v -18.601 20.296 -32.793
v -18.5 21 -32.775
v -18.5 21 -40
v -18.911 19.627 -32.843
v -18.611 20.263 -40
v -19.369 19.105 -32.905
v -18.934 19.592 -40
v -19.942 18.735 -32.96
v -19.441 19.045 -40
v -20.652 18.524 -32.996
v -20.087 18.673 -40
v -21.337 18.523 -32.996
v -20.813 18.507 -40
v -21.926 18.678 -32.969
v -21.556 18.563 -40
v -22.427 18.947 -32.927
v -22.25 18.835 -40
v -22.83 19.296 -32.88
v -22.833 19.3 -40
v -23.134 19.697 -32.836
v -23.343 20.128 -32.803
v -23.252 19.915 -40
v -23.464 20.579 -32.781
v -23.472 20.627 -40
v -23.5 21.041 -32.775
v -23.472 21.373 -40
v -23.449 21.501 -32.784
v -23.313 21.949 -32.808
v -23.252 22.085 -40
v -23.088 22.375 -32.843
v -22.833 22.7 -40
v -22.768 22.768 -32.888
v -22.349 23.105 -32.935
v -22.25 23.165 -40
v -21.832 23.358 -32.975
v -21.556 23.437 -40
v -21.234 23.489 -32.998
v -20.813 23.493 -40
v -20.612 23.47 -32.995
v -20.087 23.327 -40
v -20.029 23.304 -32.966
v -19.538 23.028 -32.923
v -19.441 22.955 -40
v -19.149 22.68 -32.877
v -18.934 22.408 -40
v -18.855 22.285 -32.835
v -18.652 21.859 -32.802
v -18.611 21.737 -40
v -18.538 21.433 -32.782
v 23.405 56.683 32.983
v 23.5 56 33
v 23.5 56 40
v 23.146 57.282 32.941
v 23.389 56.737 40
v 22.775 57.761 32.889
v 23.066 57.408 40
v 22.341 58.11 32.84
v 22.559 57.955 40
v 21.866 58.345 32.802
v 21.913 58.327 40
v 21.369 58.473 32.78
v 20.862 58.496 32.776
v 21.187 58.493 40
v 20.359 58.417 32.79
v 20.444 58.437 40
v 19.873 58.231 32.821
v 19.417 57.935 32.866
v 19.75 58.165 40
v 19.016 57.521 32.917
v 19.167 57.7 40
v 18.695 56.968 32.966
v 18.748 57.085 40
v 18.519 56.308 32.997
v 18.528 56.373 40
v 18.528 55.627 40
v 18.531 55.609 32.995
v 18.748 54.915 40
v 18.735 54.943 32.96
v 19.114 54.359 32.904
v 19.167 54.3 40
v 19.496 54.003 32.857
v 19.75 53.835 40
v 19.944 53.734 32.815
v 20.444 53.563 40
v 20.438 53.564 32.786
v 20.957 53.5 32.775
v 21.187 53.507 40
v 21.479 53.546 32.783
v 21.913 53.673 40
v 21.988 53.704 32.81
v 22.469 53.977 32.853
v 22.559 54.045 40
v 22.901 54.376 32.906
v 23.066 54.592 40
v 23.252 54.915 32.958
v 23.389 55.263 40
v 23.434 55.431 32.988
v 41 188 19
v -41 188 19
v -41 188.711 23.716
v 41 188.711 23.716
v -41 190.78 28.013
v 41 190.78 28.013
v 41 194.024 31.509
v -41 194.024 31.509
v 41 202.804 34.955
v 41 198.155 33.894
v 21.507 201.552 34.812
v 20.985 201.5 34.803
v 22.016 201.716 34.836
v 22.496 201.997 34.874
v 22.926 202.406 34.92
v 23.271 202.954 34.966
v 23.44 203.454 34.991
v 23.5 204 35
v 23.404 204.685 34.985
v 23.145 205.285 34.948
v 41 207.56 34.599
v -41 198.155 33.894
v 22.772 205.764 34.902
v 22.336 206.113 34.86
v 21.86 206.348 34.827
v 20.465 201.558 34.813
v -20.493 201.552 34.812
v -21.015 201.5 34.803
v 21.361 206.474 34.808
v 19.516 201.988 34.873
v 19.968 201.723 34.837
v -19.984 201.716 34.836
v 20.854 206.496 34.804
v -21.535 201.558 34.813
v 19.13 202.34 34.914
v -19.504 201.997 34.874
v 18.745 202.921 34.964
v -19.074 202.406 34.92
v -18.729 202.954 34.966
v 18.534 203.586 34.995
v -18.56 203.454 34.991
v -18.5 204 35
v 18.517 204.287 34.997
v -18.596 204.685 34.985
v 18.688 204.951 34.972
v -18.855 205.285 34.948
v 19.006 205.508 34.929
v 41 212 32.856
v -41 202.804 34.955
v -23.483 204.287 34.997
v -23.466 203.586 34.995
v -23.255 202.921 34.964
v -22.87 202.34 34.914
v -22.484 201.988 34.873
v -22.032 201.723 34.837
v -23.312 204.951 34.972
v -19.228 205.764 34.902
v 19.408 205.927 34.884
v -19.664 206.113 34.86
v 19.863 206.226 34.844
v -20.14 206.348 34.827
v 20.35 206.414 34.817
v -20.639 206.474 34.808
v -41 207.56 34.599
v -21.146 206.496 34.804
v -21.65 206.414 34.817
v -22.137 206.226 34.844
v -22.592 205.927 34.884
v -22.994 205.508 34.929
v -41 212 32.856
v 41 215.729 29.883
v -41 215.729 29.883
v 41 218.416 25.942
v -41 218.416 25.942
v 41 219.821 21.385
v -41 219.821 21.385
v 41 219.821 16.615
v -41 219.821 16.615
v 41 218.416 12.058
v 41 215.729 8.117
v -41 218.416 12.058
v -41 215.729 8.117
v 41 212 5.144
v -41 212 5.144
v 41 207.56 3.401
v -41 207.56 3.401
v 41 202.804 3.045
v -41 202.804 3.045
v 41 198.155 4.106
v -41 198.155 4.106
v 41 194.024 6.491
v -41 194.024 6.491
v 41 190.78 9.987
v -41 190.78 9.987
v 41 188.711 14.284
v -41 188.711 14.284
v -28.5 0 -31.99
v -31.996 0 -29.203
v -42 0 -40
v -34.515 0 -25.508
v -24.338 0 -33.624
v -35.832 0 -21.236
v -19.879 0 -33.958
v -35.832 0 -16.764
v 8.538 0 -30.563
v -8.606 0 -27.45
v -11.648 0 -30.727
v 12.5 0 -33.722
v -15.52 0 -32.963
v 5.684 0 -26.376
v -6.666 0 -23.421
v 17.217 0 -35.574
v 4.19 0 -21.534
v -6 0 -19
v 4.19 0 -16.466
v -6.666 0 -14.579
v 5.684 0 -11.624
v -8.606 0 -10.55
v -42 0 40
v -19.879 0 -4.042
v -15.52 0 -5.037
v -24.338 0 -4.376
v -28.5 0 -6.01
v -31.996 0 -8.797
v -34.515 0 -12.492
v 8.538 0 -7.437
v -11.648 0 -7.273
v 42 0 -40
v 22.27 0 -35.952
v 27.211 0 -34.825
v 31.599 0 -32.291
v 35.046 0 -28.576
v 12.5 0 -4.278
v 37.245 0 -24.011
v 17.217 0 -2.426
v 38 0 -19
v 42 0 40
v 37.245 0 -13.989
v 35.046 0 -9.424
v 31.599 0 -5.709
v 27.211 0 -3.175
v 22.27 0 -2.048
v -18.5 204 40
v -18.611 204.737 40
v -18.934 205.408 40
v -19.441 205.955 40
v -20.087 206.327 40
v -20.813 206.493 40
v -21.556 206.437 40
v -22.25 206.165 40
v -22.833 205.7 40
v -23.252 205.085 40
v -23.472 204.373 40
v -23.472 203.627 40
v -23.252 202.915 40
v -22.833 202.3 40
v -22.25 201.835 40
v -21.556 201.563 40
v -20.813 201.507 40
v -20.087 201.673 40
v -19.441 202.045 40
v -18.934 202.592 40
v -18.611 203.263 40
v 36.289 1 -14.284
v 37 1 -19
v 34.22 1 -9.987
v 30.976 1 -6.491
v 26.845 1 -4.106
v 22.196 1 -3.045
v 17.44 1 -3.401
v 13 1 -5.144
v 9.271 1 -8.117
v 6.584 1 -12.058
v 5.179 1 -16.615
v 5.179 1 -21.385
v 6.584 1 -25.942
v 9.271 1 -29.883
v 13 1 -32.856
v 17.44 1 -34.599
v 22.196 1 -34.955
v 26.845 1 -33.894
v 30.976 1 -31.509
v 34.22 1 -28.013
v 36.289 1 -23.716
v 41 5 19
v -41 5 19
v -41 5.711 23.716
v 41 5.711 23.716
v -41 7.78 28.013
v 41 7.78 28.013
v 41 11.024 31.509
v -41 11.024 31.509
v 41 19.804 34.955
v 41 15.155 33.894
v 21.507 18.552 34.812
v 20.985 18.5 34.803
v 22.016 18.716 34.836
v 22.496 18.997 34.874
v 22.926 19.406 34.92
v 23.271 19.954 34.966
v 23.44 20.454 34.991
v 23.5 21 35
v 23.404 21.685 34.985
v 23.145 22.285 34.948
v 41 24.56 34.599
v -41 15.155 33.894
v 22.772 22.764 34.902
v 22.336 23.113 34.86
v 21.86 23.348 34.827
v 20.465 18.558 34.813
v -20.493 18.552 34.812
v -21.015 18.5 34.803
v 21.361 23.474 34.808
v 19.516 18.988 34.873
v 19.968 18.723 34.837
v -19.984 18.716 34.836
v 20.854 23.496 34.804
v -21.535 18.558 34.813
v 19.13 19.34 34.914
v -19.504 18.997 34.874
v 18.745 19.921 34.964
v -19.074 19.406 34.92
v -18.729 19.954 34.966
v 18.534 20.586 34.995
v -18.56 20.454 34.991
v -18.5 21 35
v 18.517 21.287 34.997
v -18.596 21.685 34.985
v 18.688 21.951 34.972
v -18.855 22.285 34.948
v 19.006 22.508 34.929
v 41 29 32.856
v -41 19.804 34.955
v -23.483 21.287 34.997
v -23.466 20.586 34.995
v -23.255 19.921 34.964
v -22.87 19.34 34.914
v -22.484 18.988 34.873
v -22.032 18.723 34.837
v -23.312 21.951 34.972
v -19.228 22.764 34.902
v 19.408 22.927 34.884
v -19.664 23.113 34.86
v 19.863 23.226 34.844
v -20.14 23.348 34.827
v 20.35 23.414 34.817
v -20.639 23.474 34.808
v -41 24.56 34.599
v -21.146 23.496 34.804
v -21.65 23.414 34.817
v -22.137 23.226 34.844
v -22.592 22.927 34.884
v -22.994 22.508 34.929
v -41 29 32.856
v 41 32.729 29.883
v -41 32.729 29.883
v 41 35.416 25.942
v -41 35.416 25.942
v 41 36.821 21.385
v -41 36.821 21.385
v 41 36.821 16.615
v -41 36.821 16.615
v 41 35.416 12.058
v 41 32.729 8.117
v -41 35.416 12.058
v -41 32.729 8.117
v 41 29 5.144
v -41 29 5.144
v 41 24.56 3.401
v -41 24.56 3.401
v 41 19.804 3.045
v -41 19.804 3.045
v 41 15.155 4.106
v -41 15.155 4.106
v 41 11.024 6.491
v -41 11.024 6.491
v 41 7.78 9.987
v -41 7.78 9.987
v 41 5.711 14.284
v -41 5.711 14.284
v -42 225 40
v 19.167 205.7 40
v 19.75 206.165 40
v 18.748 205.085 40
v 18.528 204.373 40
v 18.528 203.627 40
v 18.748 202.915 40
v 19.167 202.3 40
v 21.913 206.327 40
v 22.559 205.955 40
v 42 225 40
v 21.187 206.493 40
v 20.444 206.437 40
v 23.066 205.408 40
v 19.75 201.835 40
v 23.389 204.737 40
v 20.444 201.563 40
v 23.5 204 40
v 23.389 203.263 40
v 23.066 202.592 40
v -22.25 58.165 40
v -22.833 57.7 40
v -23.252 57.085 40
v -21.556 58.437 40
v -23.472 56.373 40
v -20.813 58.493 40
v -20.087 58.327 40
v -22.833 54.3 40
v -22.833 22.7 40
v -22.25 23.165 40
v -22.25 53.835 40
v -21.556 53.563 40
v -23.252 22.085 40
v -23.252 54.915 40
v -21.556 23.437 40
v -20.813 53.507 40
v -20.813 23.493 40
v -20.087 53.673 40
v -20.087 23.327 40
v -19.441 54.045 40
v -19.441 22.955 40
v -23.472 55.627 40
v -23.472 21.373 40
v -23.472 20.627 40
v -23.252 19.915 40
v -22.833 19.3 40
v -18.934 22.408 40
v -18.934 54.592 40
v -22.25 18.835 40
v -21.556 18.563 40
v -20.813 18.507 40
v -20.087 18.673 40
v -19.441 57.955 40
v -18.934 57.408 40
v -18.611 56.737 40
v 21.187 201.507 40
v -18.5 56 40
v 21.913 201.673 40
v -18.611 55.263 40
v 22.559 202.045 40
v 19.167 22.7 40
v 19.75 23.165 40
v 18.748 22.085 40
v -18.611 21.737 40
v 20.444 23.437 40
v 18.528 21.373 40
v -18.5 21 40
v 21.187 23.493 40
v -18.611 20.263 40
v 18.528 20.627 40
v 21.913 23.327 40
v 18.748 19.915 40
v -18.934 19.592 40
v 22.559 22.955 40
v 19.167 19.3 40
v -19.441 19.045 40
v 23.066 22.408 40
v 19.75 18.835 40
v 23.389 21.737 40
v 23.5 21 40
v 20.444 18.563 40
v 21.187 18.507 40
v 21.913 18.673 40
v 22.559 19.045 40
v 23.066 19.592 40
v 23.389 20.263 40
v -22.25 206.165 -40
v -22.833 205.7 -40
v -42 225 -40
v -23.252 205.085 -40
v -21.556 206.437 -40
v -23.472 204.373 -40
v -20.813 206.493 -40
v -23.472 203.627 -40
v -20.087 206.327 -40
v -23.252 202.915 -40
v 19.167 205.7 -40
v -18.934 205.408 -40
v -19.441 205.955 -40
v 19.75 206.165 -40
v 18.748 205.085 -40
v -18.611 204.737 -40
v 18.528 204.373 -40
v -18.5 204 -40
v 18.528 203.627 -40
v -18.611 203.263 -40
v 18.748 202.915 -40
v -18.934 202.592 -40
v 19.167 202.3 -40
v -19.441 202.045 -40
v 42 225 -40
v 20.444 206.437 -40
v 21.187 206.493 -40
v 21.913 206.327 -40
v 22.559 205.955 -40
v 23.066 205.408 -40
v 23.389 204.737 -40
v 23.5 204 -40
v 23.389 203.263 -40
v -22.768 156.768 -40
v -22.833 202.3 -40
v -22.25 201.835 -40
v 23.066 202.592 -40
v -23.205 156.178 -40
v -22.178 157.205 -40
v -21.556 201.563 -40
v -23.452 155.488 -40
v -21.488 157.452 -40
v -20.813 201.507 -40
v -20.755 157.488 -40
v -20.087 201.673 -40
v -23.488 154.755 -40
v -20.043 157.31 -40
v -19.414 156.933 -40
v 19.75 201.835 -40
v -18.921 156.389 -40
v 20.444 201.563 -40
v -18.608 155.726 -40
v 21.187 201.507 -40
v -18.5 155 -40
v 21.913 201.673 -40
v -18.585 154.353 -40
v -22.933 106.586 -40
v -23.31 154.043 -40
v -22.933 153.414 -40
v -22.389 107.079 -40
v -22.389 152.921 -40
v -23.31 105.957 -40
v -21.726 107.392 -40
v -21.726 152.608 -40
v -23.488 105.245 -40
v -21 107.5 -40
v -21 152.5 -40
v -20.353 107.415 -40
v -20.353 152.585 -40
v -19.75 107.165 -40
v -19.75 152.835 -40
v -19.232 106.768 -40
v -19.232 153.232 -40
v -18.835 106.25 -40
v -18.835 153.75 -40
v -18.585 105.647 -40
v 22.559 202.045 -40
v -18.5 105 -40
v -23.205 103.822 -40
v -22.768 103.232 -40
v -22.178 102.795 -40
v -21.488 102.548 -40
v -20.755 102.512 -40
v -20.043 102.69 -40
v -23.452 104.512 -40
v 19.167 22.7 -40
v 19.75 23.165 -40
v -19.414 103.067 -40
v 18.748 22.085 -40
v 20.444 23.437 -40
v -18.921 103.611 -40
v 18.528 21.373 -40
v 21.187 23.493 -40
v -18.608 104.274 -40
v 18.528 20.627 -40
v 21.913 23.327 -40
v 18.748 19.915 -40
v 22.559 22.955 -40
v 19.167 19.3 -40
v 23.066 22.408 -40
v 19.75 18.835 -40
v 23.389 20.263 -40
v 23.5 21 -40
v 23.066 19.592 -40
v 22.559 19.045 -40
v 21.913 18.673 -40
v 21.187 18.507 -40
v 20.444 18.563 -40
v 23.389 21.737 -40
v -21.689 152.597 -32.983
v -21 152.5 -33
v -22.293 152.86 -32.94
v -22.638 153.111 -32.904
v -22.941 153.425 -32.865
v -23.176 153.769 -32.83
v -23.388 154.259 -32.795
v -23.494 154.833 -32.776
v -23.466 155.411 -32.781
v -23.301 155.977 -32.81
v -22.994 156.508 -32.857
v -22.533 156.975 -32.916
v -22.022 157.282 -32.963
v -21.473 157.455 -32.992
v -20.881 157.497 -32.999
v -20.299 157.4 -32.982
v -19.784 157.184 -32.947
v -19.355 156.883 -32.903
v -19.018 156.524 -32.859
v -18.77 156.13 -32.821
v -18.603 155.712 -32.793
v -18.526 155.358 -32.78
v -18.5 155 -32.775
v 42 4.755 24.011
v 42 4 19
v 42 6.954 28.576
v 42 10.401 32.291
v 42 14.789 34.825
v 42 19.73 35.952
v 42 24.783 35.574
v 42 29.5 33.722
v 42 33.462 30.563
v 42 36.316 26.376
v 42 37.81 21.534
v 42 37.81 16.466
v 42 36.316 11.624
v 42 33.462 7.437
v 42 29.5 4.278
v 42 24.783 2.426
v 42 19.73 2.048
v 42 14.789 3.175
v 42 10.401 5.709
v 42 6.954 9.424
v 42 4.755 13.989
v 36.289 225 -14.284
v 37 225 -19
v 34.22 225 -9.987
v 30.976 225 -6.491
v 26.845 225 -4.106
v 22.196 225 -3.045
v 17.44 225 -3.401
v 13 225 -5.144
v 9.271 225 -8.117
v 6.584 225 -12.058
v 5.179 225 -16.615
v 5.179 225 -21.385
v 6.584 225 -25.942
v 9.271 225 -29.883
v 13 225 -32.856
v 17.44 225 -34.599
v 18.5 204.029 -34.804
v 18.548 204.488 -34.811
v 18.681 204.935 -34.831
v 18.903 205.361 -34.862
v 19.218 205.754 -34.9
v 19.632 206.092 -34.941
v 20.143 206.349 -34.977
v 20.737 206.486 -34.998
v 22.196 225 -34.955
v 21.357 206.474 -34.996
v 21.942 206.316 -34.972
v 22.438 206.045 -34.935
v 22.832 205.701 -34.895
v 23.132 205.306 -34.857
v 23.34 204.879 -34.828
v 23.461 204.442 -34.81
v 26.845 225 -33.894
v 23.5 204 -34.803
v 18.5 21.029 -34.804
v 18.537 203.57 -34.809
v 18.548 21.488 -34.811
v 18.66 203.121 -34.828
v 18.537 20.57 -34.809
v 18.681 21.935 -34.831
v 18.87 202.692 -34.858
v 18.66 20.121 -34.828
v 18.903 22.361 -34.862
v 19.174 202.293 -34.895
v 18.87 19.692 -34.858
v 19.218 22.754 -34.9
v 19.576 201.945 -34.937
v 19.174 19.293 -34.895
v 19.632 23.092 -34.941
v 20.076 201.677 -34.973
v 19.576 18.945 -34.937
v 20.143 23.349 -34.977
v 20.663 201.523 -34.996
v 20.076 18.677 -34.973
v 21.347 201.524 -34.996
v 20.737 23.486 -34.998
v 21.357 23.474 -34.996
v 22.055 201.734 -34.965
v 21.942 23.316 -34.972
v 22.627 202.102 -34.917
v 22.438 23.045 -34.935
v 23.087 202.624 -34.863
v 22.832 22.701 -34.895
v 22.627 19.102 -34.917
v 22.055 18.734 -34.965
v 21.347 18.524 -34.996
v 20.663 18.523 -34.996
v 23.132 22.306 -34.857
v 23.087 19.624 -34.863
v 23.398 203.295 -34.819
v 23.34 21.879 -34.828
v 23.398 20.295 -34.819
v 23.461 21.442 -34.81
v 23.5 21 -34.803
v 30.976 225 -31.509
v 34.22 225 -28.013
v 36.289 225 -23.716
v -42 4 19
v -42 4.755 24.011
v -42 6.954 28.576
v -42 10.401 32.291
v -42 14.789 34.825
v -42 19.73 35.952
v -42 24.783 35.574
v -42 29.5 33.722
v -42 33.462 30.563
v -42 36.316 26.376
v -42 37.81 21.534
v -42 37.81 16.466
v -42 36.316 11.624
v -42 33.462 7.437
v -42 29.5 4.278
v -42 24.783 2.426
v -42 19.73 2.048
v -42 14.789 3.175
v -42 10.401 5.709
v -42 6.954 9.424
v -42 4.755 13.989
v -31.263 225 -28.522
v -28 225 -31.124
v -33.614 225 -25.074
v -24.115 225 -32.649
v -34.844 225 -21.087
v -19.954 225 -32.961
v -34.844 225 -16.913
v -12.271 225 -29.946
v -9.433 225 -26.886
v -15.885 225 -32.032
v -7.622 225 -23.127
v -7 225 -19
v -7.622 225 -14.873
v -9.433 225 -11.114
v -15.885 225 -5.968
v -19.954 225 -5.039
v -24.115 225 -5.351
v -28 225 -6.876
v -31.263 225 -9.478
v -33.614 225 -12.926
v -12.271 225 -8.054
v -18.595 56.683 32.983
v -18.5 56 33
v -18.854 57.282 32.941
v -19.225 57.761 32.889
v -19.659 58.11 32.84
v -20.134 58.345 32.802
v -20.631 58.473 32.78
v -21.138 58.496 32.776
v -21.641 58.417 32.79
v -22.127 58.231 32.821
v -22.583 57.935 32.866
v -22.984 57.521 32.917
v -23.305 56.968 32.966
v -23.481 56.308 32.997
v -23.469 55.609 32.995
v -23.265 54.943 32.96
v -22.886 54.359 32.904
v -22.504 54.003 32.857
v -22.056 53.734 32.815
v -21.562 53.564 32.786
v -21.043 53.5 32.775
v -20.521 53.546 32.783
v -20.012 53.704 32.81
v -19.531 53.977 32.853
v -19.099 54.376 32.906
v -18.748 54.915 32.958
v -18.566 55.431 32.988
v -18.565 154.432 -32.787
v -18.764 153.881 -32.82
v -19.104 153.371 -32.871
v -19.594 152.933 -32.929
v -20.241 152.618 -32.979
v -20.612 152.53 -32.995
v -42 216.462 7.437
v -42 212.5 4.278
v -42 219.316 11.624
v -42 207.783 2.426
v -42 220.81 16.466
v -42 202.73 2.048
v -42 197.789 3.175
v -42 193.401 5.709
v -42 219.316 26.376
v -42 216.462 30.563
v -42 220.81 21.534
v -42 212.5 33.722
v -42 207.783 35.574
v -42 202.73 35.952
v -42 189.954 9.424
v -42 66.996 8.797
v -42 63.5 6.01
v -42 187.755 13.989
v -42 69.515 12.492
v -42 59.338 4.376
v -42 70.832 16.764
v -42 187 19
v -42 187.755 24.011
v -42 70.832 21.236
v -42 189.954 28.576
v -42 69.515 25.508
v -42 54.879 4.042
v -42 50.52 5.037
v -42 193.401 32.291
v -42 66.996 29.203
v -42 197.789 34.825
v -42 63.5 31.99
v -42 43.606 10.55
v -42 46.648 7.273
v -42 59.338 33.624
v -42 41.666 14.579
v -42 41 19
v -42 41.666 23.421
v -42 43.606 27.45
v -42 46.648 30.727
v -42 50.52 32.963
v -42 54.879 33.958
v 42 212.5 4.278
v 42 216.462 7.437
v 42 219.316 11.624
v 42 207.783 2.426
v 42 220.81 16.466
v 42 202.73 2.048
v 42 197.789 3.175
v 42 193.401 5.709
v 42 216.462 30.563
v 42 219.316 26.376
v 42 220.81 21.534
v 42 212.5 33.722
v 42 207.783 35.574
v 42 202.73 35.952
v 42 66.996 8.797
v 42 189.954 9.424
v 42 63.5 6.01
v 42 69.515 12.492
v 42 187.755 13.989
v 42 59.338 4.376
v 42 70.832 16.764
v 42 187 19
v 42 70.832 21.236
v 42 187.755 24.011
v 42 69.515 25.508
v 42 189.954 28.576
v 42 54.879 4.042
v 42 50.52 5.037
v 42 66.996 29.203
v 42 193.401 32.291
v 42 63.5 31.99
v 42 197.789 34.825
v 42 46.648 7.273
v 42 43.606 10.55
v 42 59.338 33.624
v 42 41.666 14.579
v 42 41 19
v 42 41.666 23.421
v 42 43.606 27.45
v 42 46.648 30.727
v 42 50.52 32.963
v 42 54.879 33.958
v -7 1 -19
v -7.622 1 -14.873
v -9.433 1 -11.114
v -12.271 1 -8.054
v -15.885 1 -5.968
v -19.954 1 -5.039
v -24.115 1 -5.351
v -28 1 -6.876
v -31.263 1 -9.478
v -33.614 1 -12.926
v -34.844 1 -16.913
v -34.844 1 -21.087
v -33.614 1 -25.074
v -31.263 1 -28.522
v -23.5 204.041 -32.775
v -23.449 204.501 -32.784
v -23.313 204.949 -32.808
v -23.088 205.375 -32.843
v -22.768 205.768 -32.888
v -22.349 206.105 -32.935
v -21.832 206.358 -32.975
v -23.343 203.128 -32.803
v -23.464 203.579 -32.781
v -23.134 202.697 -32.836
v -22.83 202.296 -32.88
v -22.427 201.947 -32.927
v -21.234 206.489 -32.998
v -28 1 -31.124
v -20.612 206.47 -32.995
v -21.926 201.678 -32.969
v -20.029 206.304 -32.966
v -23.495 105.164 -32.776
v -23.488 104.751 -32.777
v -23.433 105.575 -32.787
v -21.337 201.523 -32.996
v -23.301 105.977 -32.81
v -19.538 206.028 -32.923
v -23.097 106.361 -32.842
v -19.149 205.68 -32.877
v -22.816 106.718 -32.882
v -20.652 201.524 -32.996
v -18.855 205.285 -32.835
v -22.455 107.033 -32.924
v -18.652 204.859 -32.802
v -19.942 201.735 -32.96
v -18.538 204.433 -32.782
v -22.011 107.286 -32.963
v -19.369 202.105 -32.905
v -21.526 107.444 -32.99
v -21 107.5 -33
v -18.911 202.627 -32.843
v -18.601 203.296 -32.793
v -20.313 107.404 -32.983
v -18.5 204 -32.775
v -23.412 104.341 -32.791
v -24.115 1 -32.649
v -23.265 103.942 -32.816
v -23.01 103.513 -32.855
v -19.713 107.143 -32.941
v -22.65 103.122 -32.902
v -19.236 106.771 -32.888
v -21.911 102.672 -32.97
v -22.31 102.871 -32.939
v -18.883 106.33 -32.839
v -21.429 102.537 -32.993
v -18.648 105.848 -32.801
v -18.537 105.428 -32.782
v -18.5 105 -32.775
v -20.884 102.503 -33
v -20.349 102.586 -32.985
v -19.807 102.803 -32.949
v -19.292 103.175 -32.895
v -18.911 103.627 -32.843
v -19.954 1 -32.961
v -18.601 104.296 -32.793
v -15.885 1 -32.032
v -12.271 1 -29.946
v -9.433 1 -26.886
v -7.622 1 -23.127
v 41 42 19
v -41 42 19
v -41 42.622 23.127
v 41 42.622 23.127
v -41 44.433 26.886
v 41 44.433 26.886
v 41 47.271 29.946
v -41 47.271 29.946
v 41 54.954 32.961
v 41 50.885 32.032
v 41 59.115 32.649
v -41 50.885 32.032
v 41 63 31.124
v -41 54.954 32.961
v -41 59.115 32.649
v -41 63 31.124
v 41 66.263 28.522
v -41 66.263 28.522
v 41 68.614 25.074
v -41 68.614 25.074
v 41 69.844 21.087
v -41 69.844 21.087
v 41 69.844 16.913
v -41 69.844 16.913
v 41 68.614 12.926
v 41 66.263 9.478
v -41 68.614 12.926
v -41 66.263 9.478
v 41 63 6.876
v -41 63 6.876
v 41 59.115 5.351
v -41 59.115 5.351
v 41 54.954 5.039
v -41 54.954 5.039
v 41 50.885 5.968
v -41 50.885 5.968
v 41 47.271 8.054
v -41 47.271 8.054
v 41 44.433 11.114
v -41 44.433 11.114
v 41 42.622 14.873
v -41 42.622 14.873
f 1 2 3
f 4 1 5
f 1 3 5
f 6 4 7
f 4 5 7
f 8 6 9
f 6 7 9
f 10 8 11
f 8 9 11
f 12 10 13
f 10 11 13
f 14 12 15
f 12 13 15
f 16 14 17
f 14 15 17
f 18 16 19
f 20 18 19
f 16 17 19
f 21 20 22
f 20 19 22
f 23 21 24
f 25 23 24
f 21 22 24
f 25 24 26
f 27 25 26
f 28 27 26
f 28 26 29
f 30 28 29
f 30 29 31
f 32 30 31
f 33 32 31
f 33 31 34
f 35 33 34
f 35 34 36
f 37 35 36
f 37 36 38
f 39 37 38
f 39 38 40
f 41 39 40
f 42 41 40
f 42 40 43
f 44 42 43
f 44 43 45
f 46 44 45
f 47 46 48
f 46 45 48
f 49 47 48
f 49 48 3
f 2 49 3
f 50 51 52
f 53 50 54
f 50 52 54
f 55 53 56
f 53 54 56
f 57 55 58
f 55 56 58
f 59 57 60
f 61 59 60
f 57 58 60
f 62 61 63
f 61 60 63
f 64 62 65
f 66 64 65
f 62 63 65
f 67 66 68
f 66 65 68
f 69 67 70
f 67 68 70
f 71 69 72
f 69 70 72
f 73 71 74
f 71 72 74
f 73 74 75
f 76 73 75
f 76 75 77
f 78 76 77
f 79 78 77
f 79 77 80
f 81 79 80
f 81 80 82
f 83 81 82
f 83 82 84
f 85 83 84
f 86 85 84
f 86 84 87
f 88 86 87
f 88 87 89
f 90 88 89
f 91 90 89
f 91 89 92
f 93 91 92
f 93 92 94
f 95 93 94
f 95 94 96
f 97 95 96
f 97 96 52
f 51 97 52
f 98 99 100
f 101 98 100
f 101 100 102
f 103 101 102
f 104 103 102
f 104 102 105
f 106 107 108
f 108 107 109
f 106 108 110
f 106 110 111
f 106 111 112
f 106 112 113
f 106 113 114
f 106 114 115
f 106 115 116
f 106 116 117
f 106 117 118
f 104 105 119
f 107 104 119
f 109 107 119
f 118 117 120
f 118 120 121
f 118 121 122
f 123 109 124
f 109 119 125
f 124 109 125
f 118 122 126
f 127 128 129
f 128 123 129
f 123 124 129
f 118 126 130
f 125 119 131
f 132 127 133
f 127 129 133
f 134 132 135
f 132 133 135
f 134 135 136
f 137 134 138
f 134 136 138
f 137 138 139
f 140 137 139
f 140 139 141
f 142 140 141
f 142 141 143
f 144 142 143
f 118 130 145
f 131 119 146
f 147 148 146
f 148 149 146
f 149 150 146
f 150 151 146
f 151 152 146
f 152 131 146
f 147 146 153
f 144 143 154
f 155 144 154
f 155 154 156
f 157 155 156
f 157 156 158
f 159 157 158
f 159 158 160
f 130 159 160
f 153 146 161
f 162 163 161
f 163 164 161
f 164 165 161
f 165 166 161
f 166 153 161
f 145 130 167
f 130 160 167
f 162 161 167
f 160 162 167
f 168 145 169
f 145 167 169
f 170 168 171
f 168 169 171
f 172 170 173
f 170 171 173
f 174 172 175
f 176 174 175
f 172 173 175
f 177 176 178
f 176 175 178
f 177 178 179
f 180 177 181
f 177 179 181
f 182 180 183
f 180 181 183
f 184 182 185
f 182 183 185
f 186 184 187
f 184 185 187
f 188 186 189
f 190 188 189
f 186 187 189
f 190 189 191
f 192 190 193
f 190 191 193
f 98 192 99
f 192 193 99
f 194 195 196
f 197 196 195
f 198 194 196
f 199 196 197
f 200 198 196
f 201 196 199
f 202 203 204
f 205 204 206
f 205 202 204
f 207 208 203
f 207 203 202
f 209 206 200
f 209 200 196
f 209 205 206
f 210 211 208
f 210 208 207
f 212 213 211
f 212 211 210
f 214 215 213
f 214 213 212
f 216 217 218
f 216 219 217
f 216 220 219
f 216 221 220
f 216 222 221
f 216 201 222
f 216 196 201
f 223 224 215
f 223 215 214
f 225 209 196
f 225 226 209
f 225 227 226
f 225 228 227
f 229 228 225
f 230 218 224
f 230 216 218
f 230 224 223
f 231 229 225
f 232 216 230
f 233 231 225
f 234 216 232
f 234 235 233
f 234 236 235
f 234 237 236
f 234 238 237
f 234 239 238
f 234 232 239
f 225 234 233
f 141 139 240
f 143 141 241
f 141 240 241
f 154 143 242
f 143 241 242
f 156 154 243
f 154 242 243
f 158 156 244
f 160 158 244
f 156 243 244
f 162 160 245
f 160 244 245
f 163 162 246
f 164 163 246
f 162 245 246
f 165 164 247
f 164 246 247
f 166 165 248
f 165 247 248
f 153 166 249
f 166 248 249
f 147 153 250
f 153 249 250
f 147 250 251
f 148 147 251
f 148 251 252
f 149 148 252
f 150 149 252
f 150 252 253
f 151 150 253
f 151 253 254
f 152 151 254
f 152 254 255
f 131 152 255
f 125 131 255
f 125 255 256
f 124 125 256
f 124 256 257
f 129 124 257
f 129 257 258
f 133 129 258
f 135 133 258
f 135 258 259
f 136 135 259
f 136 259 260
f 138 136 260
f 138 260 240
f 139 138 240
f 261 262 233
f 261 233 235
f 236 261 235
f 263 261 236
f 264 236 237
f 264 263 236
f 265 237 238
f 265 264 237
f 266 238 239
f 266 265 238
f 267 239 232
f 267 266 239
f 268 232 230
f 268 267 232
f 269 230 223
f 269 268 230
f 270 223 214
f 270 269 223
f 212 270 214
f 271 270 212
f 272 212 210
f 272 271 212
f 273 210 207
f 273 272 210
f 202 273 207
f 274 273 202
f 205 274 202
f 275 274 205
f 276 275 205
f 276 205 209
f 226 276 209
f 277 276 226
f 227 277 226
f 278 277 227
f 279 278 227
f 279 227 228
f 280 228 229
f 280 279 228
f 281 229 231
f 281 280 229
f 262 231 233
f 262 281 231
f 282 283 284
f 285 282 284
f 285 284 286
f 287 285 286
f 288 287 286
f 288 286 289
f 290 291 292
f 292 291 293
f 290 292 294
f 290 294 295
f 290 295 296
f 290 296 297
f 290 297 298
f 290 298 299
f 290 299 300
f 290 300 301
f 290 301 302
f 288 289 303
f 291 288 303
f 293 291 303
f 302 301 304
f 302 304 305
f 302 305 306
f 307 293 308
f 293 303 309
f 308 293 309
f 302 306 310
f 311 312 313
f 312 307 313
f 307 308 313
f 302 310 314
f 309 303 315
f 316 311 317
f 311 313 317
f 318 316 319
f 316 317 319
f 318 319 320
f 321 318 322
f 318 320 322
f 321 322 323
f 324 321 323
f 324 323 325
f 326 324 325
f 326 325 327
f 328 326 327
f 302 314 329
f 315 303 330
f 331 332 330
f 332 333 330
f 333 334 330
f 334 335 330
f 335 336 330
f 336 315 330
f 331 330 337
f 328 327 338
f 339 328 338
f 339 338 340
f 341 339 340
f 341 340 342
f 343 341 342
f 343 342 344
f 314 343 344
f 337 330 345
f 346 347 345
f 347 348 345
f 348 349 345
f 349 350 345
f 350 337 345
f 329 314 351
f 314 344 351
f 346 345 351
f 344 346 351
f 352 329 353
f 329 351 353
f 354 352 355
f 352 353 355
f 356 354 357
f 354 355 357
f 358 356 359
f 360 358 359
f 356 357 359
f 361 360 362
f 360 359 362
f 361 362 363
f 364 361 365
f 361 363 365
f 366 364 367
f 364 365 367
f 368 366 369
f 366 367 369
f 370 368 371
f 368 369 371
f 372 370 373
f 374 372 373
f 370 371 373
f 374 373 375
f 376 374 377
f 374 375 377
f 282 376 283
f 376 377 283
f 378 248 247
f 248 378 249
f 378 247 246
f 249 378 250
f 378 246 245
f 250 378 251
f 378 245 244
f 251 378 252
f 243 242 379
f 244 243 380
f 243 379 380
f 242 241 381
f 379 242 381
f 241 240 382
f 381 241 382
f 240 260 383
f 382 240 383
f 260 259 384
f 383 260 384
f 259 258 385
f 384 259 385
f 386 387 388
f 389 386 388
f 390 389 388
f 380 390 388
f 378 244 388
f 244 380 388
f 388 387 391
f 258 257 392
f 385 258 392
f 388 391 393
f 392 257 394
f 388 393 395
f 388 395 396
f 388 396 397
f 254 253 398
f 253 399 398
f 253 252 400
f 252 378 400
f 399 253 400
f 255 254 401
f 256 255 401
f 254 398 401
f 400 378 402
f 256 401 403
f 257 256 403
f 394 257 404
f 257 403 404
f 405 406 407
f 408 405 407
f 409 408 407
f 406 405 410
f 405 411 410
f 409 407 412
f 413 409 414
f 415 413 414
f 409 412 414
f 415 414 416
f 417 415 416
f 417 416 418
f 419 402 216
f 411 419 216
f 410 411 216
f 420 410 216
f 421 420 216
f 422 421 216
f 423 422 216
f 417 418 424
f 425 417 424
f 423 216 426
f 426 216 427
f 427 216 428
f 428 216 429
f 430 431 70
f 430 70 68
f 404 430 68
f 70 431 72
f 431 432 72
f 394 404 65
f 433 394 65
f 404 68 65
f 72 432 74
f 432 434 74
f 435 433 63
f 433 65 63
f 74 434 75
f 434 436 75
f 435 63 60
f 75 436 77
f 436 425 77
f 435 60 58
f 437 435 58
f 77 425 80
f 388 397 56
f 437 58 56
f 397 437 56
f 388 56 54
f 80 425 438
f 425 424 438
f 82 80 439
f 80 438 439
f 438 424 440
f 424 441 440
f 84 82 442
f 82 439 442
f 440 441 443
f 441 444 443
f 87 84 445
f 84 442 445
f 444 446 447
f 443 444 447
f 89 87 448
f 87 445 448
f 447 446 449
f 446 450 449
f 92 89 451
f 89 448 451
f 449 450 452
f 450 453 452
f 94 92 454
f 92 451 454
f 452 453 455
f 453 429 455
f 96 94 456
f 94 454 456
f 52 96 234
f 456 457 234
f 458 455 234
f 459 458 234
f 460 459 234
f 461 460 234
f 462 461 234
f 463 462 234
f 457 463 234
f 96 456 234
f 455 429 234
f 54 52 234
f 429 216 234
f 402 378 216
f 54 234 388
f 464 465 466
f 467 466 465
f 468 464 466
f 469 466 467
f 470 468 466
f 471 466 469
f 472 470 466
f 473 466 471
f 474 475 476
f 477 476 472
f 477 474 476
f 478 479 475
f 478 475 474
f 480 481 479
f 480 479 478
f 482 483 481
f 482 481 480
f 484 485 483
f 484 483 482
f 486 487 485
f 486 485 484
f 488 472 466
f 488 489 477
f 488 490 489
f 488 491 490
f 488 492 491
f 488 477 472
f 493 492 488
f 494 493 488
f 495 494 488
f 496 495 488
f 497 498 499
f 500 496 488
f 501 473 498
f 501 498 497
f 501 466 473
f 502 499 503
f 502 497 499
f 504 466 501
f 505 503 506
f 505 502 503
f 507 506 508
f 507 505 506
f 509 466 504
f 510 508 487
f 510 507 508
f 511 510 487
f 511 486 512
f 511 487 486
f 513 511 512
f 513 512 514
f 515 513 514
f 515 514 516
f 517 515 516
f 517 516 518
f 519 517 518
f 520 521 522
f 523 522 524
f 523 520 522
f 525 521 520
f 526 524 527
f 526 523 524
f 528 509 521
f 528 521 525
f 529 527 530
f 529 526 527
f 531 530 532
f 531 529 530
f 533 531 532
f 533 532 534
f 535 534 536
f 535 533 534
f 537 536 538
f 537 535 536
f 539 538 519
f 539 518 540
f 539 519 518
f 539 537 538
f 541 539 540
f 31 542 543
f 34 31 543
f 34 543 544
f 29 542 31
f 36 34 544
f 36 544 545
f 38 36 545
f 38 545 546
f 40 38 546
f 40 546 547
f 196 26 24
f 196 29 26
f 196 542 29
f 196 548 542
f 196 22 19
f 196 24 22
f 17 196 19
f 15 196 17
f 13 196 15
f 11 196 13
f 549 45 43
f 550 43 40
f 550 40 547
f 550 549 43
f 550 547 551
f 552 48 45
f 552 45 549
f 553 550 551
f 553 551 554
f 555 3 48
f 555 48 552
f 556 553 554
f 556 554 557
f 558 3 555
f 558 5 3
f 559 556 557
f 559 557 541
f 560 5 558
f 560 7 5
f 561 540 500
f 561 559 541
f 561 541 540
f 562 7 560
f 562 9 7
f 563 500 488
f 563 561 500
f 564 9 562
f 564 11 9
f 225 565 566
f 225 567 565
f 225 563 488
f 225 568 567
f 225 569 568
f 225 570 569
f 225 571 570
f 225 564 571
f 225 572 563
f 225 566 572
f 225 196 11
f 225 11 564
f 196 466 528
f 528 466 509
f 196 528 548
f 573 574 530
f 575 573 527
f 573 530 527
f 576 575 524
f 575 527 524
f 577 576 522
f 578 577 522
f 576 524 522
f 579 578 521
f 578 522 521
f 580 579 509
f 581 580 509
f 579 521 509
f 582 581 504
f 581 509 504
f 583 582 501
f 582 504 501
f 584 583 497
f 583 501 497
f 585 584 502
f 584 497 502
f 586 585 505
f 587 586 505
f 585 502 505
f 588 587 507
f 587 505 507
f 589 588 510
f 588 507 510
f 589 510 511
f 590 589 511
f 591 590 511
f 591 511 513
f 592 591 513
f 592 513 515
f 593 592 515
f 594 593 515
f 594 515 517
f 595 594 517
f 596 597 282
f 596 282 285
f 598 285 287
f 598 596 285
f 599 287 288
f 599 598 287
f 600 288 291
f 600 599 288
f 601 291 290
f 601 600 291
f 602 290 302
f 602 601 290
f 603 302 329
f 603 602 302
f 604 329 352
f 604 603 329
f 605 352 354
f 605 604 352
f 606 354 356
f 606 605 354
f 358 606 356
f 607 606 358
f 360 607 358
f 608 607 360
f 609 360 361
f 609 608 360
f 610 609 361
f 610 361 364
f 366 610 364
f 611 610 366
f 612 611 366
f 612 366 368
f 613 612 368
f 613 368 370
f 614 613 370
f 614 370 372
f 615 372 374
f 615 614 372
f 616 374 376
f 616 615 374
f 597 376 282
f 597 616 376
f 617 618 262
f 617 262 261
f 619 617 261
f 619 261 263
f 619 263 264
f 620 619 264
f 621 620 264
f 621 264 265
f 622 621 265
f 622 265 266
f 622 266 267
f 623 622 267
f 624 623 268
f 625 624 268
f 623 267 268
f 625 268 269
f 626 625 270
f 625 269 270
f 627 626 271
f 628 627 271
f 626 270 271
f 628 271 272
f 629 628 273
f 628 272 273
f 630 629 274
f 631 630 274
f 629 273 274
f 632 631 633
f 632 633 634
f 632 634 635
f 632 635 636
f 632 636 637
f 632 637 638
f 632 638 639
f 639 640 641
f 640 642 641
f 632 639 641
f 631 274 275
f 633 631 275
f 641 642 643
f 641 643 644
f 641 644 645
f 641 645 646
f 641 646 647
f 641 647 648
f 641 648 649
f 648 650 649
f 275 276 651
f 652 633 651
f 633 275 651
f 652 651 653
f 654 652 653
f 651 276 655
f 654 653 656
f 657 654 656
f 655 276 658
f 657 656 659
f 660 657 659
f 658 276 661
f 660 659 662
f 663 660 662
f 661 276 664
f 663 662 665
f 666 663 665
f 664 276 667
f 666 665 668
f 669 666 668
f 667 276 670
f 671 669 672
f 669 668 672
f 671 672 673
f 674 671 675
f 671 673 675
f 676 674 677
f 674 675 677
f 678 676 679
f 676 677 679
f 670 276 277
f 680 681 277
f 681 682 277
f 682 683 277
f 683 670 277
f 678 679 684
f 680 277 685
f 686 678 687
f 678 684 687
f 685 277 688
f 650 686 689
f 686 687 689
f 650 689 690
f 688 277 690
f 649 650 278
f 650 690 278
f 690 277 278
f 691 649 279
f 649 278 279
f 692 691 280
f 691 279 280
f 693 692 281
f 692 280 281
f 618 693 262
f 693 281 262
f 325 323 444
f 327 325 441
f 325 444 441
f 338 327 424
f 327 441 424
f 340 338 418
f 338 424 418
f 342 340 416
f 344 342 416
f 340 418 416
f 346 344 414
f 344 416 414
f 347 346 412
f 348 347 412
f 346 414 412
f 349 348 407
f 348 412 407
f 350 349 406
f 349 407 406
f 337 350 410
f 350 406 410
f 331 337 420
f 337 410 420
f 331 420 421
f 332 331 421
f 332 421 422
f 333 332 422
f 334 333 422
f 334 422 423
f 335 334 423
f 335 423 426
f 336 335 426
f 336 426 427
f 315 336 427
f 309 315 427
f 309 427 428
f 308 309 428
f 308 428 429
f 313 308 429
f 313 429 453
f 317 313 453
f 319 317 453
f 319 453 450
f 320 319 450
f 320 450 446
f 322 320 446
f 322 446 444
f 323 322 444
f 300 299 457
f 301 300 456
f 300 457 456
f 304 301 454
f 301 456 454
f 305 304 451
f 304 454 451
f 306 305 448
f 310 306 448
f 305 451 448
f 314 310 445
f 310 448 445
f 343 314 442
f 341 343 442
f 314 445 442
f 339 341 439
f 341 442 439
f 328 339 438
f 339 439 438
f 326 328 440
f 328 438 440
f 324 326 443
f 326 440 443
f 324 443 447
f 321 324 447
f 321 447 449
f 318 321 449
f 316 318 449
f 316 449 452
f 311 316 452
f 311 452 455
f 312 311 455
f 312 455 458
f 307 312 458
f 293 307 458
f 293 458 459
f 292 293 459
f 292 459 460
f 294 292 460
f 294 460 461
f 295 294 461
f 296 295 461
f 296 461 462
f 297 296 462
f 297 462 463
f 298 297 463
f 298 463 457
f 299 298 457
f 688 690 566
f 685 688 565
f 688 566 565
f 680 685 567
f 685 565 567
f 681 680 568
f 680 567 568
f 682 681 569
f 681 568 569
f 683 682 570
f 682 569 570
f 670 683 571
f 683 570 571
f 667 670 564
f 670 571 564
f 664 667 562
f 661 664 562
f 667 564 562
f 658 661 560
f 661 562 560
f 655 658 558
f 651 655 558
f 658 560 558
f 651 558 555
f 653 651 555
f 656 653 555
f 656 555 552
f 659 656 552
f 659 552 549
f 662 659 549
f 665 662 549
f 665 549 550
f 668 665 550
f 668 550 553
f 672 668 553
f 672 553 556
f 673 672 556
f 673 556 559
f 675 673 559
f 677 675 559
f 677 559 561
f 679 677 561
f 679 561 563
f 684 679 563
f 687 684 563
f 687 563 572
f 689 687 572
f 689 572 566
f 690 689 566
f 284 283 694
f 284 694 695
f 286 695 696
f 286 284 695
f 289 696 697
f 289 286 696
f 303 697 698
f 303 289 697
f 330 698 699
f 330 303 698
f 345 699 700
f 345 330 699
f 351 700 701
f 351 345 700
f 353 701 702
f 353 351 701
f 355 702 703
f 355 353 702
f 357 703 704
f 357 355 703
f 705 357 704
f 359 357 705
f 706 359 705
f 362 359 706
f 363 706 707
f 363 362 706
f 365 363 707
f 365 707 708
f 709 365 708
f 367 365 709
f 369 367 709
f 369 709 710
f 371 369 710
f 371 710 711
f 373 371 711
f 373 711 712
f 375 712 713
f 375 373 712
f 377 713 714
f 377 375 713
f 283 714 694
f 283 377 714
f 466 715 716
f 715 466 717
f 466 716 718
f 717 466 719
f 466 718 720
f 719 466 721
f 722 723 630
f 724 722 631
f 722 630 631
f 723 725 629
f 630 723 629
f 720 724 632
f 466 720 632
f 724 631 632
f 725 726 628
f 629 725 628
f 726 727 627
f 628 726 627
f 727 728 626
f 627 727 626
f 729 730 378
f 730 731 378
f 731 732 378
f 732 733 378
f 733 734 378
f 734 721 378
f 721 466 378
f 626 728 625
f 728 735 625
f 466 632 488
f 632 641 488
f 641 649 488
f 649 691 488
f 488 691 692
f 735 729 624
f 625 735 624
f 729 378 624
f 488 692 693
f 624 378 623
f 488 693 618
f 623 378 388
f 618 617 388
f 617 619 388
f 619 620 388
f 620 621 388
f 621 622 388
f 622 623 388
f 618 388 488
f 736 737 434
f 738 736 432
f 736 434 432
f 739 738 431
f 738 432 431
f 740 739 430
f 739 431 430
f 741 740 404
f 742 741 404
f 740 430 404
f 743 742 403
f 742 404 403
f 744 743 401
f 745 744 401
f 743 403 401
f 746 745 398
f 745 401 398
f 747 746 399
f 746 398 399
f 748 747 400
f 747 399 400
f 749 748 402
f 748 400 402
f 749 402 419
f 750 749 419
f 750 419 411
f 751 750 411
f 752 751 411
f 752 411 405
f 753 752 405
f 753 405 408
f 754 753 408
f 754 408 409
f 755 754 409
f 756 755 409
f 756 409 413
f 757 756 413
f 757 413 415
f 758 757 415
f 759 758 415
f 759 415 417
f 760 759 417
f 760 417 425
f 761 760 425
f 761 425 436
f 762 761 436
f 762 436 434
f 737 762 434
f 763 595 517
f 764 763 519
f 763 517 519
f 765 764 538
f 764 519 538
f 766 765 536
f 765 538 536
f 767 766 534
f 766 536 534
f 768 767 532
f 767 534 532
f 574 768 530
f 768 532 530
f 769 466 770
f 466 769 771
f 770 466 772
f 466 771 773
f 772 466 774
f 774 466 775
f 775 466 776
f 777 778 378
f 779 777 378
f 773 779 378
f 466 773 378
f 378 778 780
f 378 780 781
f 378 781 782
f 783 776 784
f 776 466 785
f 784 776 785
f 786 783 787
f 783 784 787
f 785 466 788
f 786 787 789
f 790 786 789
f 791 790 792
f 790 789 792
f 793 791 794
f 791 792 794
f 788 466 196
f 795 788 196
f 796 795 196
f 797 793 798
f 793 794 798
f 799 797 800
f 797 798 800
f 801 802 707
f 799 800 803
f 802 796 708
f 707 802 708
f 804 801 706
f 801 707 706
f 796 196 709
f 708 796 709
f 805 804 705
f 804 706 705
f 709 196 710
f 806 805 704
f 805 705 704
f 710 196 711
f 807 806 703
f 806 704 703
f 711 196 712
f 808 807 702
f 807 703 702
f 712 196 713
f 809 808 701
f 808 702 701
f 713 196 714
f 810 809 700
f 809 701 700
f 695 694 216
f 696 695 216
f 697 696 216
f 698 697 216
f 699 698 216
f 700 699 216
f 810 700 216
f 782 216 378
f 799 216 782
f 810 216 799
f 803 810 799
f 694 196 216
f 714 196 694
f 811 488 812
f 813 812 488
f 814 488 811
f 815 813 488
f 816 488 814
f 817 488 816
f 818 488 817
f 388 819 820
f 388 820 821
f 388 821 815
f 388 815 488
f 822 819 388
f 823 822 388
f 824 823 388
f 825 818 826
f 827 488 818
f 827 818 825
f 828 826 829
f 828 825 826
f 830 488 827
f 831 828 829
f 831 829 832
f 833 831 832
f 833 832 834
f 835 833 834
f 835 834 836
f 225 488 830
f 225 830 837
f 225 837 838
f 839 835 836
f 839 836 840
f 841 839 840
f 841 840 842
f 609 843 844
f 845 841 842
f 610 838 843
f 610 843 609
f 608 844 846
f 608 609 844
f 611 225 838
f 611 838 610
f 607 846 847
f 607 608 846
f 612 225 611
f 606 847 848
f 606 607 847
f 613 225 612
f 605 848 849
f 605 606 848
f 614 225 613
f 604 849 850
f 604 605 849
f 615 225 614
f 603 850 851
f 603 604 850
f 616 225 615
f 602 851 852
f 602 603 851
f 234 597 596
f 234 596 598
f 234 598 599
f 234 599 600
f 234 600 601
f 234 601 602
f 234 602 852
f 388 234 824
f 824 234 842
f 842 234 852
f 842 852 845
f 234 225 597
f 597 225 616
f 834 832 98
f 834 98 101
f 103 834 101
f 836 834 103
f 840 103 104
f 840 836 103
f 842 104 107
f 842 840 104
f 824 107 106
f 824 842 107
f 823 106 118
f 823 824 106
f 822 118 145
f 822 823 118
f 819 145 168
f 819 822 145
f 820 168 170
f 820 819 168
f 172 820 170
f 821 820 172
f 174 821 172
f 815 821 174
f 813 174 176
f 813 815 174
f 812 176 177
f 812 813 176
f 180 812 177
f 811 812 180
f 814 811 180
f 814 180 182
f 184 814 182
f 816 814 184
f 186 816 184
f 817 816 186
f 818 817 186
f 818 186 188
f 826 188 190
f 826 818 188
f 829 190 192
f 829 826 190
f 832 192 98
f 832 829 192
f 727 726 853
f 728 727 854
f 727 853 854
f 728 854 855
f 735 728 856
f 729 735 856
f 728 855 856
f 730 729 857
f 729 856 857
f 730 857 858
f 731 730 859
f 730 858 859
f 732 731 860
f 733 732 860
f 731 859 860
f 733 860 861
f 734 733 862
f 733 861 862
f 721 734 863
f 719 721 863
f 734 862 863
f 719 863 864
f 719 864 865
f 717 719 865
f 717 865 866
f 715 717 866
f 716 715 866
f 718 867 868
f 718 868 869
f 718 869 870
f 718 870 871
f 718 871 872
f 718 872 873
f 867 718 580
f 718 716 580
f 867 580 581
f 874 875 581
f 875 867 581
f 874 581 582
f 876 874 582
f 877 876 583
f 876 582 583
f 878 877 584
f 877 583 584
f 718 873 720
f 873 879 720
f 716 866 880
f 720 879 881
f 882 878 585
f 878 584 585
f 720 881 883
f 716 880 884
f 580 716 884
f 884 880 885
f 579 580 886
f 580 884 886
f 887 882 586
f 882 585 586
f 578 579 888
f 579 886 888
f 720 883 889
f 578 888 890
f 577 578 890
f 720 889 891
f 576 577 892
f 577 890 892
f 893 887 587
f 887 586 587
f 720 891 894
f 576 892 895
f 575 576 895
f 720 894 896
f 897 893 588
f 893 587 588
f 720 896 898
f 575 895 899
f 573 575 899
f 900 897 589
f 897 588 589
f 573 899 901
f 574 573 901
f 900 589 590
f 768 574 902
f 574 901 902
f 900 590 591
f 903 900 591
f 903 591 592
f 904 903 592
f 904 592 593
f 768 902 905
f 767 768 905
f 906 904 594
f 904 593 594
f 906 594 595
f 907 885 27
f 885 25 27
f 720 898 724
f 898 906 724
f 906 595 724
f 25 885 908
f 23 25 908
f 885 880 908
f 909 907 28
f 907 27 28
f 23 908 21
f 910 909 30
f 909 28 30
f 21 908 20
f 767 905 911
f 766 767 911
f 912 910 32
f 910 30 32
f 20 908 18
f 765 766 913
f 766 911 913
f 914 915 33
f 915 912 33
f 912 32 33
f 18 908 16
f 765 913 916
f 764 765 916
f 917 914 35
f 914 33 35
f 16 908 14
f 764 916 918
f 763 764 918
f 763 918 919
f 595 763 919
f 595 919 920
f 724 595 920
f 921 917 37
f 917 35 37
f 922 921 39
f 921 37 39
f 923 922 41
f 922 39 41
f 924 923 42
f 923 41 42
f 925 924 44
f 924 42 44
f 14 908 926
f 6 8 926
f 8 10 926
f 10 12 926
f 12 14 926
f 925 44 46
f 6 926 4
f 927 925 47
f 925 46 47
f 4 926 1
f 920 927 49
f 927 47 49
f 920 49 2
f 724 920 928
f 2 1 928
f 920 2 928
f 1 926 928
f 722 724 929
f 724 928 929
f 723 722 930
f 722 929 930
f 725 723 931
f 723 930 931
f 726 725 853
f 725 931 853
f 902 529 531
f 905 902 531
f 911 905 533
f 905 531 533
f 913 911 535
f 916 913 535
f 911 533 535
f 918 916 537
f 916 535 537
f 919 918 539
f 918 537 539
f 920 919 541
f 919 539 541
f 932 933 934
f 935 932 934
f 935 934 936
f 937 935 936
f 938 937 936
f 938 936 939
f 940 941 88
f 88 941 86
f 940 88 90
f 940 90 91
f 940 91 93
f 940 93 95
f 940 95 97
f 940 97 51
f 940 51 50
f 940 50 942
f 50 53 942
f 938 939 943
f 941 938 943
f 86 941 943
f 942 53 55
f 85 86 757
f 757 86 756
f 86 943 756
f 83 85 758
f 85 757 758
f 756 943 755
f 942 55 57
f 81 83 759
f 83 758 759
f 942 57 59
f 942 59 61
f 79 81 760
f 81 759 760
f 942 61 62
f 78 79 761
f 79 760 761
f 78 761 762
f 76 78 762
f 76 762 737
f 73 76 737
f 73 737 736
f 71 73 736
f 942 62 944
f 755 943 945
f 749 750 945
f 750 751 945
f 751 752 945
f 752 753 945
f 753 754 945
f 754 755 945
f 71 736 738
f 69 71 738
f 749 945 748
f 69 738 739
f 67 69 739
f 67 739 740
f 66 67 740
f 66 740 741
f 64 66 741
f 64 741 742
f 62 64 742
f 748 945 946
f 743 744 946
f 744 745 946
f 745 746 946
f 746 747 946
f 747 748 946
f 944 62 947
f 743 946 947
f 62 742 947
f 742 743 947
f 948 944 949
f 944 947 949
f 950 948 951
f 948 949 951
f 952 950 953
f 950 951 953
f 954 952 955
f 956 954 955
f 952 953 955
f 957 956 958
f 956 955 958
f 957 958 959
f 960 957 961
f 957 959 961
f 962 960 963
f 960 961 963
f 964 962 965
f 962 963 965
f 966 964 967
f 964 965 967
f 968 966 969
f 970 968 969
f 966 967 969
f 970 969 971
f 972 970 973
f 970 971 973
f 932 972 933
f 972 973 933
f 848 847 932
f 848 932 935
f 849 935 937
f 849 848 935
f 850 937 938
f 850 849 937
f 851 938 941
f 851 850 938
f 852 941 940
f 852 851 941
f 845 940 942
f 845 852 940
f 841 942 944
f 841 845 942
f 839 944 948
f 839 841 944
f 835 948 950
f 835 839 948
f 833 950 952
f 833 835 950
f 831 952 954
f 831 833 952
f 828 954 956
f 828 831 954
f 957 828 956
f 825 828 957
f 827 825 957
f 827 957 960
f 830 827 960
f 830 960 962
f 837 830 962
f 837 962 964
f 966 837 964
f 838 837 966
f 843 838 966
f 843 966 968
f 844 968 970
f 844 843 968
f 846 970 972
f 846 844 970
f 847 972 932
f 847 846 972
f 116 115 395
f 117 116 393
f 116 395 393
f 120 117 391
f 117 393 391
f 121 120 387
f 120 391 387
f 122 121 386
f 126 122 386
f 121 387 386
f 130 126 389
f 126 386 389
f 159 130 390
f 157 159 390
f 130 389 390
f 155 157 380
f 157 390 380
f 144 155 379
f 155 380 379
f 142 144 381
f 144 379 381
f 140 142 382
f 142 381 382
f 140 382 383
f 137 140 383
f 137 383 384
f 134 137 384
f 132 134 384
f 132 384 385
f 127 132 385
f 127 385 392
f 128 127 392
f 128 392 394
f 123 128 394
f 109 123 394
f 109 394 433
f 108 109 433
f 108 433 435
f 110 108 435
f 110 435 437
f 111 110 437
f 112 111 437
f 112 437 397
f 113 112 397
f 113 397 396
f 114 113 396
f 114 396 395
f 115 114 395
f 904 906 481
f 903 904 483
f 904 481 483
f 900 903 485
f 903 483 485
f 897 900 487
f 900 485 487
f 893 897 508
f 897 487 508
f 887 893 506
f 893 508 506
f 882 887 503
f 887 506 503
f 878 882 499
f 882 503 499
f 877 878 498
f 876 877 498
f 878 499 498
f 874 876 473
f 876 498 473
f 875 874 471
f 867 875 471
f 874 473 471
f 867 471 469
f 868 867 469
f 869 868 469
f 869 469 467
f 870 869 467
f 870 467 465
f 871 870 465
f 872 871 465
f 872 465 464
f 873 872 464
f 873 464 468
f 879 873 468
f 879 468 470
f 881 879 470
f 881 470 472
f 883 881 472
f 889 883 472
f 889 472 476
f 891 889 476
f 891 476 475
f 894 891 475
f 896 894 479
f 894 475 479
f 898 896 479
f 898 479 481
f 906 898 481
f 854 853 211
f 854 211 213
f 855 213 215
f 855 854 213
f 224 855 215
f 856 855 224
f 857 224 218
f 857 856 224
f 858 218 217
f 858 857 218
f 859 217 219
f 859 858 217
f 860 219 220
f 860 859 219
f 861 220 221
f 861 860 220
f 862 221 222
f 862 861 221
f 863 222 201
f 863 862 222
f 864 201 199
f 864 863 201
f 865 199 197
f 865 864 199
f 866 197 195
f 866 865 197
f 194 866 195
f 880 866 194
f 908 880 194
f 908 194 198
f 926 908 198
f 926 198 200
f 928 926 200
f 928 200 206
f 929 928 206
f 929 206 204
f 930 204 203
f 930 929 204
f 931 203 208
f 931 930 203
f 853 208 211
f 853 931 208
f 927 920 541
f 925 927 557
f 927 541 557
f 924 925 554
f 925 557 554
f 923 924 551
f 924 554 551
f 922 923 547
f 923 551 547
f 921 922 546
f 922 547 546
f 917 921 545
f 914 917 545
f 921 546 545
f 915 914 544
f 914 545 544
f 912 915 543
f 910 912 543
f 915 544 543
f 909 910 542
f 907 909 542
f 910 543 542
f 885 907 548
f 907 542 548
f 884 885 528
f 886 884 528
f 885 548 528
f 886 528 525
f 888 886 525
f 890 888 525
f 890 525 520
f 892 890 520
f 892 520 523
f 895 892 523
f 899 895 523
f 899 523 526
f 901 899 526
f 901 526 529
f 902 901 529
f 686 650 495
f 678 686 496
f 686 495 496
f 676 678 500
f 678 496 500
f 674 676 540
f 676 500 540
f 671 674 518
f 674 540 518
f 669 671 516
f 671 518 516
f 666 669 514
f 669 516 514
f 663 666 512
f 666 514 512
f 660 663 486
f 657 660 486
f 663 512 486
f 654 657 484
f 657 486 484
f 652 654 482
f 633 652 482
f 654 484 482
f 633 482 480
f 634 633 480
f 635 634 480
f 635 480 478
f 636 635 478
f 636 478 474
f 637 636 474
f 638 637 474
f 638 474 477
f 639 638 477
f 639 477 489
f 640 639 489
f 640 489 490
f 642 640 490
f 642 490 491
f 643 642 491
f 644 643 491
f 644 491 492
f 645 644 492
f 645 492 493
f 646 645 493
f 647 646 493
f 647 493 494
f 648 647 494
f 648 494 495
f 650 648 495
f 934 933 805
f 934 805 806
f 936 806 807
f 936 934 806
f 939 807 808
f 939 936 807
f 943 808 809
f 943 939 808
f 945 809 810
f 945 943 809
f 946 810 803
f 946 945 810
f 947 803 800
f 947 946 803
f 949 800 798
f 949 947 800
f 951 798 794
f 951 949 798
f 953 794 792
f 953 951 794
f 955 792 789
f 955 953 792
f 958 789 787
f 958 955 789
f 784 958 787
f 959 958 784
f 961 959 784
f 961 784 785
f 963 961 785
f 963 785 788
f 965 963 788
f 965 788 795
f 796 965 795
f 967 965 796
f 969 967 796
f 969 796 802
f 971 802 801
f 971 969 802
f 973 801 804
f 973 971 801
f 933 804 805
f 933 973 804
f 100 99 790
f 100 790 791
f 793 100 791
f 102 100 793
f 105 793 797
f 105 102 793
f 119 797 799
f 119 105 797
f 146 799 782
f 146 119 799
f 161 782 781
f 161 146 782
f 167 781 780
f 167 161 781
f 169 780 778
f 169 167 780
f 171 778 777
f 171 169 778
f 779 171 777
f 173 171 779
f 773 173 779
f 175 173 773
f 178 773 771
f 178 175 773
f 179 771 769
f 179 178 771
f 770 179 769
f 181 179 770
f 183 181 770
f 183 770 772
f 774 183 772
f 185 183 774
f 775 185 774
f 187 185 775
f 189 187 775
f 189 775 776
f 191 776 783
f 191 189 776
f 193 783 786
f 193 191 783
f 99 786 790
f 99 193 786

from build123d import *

# Parameters (mm, degrees)
F0_W     = 84
F0_H     = 80
F0_R     = 14
F0_R_2   = 16
F1_DEPTH = 225
F2_R     = 16
F2_R_2   = 14
F3_DEPTH = 100
F4_SIZE  = 1
F5_R     = 2.5
F6_DEPTH = 25
F7_R     = 2.5
F8_DEPTH = 25


# Not quite as in the source:
# - a feature names something its author has since deleted; it is built from what else it names


with BuildPart() as f1:
    # F0 (on Front) → F1 (new body)
    with BuildSketch(Plane.XZ):
        Rectangle(F0_W, F0_H)
        with Locations((-21, -19)):
            Circle(F0_R, mode=Mode.SUBTRACT)
        with Locations((21, -19)):
            Circle(F0_R_2, mode=Mode.SUBTRACT)
    extrude(amount=-F1_DEPTH)

    # F2 (on face) → F3 (cut)
    with BuildSketch(Plane(origin=(-42, 0, 0), x_dir=(0, -1, 0), z_dir=(-1, 0, 0))):
        with Locations((-204, 19)):
            Circle(F2_R)
        with Locations((-56, 19)):
            Circle(F2_R_2)
        with Locations((-21, 19)):
            Circle(F2_R)
    extrude(amount=-F3_DEPTH, mode=Mode.SUBTRACT)

    # F4
    f4_edges = [f1.edges().sort_by_distance(p)[0] for p in [
        (-42, 220, 19),
        (-42, 70, 19),
        (-42, 37, 19),
        (-35, 0, -19),
        (5, 0, -19),
        (42, 37, 19),
        (42, 70, 19),
        (42, 220, 19),
    ]]
    chamfer(f4_edges, length=F4_SIZE)

    # F5 (on face) → F6 (cut)
    with BuildSketch(Plane.XY.offset(40)):
        with Locations((21, 204)):
            Circle(F5_R)
        with Locations((21, 56)):
            Circle(F5_R)
        with Locations((21, 21)):
            Circle(F5_R)
        with Locations((-21, 21)):
            Circle(F5_R)
        with Locations((-21, 56)):
            Circle(F5_R)
        with Locations((-21, 204)):
            Circle(F5_R)
    extrude(amount=-F6_DEPTH, mode=Mode.SUBTRACT)

    # F7 (on face) → F8 (cut)
    with BuildSketch(Plane(origin=(0, 0, -40), x_dir=(1, 0, 0), z_dir=(0, 0, -1))):
        with Locations((-21, -21)):
            Circle(F7_R)
        with Locations((21, -21)):
            Circle(F7_R)
        with BuildLine():
            ThreePointArc((-18.5, -105), (-22.767766953, -103.232233047), (-21, -107.5))
            ThreePointArc((-21, -107.5), (-19.232233047, -106.767766953), (-18.5, -105))
        make_face()
        with BuildLine():
            ThreePointArc((-21, -152.5), (-22.767766953, -156.767766953), (-18.5, -155))
            ThreePointArc((-18.5, -155), (-19.232233047, -153.232233047), (-21, -152.5))
        make_face()
        with Locations((-21, -204)):
            Circle(F7_R)
        with Locations((21, -204)):
            Circle(F7_R)
    extrude(amount=-F8_DEPTH, mode=Mode.SUBTRACT)


solid = f1.part
